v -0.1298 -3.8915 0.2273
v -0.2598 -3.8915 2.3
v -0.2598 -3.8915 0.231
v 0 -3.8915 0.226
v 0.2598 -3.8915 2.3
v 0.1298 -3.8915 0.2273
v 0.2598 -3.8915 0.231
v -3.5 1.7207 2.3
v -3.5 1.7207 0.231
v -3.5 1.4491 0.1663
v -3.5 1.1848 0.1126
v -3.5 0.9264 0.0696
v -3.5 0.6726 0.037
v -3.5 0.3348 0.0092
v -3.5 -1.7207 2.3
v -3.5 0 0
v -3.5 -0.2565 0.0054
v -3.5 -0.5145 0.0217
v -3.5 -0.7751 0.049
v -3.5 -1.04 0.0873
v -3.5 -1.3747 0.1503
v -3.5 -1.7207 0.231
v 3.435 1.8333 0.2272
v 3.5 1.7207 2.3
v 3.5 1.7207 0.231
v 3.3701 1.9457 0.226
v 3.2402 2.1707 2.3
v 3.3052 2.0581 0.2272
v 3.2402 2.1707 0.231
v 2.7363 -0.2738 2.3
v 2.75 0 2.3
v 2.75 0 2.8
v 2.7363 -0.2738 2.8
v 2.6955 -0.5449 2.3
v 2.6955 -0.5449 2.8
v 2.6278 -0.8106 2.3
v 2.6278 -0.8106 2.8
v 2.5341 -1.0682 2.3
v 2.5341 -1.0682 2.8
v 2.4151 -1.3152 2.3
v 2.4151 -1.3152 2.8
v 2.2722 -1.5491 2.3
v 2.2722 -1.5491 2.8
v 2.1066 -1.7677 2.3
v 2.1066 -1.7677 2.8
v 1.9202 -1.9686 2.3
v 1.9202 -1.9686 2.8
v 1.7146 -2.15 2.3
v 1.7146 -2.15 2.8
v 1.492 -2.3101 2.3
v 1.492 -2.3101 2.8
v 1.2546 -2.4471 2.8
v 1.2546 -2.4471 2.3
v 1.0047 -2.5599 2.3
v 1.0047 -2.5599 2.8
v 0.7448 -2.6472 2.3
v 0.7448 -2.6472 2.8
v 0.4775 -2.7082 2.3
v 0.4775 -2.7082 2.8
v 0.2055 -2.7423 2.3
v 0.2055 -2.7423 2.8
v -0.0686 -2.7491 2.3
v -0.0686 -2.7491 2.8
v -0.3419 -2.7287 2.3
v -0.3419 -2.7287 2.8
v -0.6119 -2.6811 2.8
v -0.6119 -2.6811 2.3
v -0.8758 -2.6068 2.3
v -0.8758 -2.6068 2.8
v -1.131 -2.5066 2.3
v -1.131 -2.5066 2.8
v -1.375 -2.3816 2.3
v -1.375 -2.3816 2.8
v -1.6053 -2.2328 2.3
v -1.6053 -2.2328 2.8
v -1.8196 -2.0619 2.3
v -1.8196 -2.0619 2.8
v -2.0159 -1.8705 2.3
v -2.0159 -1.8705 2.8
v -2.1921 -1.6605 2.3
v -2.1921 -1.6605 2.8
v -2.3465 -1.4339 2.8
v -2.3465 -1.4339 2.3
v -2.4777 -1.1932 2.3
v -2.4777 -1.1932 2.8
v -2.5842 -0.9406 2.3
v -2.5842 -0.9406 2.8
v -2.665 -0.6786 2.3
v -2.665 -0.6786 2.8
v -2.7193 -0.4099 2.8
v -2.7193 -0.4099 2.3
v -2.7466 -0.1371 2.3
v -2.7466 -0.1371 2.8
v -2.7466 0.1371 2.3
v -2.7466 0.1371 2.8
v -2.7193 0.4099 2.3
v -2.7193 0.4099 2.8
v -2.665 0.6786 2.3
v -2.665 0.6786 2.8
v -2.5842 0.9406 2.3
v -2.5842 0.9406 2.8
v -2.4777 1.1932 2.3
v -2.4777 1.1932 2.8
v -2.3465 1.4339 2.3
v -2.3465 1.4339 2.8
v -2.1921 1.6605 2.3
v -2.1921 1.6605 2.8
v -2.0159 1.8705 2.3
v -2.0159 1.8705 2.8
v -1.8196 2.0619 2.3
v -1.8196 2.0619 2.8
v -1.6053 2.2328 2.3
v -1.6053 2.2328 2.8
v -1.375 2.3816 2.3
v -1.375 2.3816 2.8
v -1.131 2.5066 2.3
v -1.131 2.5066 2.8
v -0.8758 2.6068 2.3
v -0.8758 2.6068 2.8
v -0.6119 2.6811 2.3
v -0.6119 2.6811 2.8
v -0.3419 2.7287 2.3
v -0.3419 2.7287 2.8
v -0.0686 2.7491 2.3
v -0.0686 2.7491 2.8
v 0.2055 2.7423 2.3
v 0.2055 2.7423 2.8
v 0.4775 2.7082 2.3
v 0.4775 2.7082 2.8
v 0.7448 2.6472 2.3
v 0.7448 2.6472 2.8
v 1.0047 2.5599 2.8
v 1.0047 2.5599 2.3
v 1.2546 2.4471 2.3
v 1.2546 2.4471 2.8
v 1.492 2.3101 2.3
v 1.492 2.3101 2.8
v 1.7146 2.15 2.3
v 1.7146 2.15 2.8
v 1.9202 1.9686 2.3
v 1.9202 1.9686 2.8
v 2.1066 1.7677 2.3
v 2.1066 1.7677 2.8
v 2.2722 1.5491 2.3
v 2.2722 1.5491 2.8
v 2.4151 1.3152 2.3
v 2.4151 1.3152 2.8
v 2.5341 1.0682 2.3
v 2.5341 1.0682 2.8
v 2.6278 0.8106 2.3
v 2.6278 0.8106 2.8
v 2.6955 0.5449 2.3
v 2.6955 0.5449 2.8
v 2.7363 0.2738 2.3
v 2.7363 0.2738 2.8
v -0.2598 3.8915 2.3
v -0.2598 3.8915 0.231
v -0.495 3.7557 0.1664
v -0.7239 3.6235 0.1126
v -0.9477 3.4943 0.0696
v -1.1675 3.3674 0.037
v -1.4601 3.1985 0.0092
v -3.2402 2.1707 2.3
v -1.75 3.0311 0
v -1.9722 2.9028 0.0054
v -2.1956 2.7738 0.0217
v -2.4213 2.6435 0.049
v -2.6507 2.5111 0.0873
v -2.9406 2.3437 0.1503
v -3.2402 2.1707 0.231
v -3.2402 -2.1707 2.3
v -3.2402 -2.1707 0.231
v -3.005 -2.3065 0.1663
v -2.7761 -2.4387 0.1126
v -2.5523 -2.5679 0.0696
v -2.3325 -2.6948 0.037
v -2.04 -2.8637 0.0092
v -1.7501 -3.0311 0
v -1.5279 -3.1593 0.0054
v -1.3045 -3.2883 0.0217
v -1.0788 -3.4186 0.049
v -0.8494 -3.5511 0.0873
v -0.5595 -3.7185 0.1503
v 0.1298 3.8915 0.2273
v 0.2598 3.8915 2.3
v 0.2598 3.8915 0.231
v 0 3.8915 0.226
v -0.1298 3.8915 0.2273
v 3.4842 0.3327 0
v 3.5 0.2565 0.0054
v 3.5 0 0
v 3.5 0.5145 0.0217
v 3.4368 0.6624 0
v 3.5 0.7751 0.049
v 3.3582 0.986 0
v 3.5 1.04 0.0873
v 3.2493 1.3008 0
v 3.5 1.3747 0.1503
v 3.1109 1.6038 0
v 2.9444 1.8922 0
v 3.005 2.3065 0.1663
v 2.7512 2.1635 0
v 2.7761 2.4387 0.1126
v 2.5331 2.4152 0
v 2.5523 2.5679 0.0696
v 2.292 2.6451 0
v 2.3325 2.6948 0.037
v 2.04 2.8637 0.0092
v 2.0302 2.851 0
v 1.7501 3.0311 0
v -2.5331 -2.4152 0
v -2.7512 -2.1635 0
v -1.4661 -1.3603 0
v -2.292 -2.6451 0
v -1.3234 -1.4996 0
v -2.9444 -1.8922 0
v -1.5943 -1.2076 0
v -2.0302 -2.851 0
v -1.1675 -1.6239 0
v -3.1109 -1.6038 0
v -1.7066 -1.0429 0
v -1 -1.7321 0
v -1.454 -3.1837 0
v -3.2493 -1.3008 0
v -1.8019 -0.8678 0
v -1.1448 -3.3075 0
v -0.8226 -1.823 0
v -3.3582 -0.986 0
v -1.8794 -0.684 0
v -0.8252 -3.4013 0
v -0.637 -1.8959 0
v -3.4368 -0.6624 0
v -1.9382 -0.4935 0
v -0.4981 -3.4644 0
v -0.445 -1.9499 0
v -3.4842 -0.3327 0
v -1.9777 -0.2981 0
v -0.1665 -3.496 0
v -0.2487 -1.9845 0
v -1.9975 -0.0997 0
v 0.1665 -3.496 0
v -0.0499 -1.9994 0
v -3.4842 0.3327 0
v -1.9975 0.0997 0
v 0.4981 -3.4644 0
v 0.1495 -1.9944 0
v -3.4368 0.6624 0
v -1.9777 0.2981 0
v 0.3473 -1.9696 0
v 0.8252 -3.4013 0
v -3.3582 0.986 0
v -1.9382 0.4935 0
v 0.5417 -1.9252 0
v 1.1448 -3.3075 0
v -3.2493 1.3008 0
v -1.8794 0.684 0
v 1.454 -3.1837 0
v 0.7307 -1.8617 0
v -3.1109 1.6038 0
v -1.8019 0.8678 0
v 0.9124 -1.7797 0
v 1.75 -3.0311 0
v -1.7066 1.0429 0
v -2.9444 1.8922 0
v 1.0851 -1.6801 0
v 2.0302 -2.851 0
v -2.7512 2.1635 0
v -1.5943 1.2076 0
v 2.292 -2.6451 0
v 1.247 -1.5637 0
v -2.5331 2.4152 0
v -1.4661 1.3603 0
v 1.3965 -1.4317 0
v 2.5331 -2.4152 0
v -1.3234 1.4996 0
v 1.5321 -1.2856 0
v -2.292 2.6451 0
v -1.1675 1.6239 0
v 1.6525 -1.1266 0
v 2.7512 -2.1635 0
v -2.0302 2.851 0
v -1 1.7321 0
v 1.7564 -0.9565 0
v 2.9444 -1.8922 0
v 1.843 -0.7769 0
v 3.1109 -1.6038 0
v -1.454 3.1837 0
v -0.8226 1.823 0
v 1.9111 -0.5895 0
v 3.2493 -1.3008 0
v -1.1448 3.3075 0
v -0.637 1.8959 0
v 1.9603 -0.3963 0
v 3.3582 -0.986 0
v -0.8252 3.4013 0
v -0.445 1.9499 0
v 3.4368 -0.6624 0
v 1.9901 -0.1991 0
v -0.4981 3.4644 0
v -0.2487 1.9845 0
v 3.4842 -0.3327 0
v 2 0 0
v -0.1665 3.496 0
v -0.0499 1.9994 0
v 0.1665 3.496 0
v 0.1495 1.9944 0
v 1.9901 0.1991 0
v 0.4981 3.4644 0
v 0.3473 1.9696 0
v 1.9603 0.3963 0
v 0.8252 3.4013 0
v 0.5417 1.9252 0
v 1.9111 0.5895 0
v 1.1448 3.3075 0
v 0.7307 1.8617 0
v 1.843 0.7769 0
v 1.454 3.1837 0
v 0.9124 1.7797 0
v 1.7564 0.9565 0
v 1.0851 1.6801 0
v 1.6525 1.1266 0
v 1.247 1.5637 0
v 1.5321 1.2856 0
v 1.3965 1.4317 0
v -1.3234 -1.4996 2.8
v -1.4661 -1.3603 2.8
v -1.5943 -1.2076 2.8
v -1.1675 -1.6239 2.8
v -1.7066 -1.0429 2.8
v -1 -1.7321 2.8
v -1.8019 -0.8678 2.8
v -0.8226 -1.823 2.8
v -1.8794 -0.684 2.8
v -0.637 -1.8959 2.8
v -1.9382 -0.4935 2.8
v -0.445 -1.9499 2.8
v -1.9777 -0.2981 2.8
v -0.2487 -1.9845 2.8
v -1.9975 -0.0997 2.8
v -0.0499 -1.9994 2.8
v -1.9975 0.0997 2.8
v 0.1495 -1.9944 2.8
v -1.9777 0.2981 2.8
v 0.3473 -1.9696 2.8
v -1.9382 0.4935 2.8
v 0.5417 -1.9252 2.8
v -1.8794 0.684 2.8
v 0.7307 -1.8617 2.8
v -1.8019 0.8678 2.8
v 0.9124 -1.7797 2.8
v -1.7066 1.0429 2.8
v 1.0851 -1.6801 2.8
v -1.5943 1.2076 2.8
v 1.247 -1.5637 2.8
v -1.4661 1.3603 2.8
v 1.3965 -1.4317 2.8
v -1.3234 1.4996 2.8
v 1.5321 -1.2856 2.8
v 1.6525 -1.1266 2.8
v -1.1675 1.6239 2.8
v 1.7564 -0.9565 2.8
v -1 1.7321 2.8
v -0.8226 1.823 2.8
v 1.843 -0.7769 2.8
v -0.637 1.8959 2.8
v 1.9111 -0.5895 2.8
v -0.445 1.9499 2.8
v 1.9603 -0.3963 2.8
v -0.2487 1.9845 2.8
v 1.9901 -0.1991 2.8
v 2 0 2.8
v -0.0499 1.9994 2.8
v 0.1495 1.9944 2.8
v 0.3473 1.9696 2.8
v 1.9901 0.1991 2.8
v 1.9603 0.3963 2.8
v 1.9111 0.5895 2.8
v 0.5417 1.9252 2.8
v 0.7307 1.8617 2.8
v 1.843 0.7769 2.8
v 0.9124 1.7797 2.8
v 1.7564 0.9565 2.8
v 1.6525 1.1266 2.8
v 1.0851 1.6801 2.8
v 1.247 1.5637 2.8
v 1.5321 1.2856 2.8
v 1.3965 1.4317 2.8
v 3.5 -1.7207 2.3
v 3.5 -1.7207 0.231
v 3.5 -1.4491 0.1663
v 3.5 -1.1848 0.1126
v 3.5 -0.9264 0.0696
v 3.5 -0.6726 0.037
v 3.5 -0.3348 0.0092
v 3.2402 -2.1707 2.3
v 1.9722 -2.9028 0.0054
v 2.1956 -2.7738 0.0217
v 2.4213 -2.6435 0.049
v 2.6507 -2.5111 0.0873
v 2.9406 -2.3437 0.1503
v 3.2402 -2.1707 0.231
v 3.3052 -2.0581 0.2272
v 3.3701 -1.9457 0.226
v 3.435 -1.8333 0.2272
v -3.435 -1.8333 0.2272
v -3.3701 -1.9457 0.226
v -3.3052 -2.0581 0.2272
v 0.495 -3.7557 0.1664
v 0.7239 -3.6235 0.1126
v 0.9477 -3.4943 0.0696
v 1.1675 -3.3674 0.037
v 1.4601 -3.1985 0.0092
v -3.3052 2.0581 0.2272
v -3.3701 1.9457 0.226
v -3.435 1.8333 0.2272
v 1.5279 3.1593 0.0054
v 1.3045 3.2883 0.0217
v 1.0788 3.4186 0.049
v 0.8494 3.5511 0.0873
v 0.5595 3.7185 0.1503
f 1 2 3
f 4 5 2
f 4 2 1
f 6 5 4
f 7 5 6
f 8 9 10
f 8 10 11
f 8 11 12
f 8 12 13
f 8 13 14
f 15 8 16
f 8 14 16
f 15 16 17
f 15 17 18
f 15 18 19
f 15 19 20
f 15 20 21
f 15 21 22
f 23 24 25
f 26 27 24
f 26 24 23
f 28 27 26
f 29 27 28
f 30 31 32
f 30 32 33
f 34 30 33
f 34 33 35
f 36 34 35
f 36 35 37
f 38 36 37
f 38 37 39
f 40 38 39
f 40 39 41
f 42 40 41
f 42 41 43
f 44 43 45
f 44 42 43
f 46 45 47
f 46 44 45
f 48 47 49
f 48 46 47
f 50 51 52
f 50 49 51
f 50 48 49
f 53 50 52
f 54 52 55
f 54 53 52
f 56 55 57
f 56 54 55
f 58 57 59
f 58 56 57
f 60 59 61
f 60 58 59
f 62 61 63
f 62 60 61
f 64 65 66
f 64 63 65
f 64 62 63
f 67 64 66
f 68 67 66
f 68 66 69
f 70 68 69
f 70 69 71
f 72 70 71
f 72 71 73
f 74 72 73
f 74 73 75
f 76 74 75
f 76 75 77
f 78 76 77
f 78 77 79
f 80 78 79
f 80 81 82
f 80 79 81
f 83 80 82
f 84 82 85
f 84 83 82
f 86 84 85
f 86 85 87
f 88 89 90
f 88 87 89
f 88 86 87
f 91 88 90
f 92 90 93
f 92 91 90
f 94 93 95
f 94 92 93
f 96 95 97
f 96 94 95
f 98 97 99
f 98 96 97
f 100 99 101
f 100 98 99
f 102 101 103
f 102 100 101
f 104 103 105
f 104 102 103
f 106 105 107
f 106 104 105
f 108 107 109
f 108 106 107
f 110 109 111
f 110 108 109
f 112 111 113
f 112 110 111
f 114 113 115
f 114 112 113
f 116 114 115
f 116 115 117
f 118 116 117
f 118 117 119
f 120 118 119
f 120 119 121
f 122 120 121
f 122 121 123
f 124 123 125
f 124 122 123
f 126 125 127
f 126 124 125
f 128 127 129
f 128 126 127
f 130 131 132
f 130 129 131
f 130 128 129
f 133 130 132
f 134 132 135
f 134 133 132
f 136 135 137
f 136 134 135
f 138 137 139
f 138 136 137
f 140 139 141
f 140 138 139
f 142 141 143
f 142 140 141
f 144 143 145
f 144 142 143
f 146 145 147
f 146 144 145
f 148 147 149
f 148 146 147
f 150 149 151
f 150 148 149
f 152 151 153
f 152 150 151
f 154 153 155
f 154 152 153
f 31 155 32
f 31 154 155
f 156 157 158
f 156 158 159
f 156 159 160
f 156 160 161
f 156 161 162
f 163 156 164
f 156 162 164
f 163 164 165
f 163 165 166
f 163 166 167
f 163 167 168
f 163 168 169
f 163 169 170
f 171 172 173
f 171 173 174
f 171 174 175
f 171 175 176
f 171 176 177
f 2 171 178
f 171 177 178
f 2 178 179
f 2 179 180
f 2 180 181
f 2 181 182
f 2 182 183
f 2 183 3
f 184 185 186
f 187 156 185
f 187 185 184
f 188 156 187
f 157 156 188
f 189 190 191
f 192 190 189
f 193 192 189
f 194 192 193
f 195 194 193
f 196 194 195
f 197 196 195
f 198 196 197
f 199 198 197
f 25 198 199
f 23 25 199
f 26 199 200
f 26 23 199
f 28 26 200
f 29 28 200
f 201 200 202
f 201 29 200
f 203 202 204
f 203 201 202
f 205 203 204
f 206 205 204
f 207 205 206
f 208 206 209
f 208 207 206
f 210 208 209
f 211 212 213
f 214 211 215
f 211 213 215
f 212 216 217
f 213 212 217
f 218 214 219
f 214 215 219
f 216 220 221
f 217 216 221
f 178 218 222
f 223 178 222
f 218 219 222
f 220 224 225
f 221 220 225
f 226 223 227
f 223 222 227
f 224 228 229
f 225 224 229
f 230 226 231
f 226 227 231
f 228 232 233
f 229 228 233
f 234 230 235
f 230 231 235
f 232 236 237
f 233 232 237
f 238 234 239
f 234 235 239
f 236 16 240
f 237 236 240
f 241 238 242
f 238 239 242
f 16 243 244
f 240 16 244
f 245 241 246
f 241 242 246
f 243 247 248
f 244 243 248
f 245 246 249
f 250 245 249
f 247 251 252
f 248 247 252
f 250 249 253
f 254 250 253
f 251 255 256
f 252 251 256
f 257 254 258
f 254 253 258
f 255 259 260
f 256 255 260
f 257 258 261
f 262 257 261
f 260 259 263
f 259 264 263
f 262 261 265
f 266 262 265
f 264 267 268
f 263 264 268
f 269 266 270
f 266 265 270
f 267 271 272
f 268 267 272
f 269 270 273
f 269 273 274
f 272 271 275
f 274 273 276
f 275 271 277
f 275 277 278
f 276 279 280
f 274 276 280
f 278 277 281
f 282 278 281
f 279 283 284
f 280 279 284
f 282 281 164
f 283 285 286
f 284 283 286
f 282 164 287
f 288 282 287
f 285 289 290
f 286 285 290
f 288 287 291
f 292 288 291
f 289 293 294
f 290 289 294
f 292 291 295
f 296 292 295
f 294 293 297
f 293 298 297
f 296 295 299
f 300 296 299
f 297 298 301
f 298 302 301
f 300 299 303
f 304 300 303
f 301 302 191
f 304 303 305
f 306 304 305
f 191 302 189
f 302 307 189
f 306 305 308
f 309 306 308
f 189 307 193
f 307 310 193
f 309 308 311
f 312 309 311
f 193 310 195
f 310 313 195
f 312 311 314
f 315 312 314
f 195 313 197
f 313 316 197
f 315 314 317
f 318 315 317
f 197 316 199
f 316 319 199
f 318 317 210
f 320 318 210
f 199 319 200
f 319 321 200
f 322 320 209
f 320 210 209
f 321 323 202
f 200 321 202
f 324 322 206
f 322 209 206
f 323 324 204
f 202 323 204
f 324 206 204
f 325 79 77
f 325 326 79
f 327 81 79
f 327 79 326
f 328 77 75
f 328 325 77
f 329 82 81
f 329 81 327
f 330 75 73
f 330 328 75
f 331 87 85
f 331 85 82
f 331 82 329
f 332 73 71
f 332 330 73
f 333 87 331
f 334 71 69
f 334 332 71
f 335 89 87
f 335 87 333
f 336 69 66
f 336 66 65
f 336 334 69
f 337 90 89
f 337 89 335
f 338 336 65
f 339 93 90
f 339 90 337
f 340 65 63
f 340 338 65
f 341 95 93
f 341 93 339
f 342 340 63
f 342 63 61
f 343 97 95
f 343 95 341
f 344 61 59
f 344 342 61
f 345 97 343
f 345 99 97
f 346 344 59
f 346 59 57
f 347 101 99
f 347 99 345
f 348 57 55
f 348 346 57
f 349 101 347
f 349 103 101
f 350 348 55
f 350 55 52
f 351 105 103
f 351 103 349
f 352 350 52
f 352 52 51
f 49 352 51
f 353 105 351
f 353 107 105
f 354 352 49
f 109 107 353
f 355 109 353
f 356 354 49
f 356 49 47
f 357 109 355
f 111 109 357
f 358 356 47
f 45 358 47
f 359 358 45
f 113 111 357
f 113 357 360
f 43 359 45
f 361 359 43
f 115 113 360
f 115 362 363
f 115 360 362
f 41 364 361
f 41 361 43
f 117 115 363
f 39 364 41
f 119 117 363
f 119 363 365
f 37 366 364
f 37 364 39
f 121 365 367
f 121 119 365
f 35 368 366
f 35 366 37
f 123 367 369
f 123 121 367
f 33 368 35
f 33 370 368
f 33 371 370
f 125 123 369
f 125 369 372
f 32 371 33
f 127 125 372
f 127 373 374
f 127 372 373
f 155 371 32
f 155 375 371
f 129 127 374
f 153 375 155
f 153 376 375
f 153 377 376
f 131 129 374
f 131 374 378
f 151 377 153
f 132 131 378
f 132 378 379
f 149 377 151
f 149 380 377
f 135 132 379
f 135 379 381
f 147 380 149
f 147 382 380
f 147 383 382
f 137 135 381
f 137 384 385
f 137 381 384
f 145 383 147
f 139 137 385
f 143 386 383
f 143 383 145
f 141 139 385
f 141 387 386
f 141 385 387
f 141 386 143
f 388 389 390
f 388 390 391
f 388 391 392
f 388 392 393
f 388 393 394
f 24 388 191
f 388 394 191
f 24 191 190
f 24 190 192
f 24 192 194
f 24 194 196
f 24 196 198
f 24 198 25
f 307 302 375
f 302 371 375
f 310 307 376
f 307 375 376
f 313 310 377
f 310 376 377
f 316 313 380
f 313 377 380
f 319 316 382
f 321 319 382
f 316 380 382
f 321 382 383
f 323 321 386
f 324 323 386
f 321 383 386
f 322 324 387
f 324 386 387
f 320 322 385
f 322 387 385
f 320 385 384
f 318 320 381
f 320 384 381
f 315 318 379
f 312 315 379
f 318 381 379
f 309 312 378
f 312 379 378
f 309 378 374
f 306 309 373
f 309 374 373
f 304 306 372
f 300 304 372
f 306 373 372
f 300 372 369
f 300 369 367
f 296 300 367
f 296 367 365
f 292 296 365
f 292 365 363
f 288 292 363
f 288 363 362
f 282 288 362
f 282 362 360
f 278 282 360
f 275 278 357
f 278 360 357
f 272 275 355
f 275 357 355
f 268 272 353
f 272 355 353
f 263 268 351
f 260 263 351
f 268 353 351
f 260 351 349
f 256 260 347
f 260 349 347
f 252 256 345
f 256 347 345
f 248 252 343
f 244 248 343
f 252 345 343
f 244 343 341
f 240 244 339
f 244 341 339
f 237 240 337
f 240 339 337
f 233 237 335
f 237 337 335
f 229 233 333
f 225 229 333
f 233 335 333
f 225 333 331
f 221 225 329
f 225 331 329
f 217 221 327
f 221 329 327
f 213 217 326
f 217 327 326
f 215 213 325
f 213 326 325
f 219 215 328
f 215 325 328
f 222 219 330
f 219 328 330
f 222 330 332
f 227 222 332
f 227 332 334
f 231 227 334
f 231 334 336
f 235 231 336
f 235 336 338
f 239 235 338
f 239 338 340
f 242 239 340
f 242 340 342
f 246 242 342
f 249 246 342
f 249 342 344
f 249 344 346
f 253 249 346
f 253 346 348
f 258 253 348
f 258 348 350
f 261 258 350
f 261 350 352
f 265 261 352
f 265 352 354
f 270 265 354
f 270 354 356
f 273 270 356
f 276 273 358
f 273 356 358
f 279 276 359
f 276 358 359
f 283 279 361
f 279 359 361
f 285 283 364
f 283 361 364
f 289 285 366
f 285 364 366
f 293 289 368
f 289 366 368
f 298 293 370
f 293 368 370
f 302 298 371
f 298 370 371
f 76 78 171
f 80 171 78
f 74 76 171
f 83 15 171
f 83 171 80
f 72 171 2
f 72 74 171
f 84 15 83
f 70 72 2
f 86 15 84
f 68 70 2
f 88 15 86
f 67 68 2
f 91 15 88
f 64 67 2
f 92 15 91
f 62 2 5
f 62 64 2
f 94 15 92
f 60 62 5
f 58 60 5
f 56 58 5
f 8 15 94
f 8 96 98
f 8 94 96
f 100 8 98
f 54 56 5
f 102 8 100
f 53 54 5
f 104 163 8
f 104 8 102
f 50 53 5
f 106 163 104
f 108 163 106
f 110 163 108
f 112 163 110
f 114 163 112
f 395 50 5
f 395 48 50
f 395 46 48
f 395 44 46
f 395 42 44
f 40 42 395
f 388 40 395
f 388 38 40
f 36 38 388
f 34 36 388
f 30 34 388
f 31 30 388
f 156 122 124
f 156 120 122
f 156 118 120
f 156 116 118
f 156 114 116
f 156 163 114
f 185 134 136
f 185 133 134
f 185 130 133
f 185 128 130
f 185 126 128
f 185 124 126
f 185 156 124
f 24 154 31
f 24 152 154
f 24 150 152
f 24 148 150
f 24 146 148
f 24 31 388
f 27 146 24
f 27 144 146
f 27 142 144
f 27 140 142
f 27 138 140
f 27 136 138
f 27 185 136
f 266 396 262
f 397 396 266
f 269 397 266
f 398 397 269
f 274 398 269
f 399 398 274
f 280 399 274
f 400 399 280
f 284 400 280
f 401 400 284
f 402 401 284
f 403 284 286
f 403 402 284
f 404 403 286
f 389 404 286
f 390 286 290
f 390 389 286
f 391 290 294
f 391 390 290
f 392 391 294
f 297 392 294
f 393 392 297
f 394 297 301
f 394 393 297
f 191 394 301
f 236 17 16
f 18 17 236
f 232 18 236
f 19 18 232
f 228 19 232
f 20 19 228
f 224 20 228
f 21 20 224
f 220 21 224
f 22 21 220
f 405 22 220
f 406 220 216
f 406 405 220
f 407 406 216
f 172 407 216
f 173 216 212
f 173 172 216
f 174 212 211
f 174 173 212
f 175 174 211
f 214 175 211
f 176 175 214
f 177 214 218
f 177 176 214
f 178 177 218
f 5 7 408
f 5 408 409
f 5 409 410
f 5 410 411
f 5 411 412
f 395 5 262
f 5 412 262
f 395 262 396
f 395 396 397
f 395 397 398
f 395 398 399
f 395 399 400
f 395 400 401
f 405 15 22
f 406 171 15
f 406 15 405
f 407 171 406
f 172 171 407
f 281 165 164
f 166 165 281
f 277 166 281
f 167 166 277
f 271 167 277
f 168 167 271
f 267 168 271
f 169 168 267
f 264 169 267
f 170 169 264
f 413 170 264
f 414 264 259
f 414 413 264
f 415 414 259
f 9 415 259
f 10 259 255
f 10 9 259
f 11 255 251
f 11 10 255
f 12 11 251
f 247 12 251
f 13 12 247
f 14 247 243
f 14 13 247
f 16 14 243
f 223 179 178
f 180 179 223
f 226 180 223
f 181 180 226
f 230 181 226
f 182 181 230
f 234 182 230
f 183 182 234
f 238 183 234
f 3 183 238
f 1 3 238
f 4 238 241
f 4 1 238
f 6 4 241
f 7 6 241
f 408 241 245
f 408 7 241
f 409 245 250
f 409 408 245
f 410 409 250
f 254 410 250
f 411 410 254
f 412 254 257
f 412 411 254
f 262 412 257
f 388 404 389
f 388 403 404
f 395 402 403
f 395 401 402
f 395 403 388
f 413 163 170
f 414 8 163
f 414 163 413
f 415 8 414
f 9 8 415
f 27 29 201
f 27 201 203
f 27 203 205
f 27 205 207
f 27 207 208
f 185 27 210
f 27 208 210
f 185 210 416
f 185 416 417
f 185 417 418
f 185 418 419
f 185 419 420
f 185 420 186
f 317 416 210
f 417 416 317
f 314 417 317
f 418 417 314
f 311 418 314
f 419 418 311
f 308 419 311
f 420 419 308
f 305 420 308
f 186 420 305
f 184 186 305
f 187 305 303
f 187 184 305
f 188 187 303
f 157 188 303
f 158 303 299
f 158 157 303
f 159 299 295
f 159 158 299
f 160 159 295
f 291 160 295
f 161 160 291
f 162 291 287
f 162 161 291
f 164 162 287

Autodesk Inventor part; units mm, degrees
ref_plane "YZ Plane" through (0, 0, 0) normal (1, 0, 0) x (0, 1, 0)
ref_plane "XZ Plane" through (0, 0, 0) normal (0, 1, 0) x (-1, 0, 0)
ref_plane "XY Plane" through (0, 0, 0) normal (0, 0, 1) x (1, 0, 0)
sketch "スケッチ1" plane through (0, 0, 0) normal (0, 1, 0) x (-1, 0, 0)
  line L0 (-2, 0) -> (-2, 2.8)
  line L1 (-2, 2.8) -> (-2.75, 2.8)
  line L2 (-2.75, 2.8) -> (-2.75, 2.3)
  line L3 (-2.75, 2.3) -> (-4.0415, 2.3)
  line L4 (-4.0415, 2.3) -> (-4.0415, 0.3126)
  line L5 (-3.5, 0) -> (-2, 0)
  line L6 (-4.0415, 0.3126) -> (-3.5, 0)
  line L7 (0, -0.56) -> (0, 3.36) projected
  point P0 (0, 0)
  dimension "d0" = 3.5
  dimension "d1" = 4.0415
  dimension "d2" = 30
  dimension "d3" = 0.5
  dimension "d4" = 2.8
  dimension "d5" = 4
  dimension "d6" = 5.5
revolve "回転1" add sketch "スケッチ1" angle 360 about axis through (0, 0, -10) along (0, 0, 1)
sketch "スケッチ2" plane through (0, 0, 0) normal (0, 0, -1) x (-1, 0, 0)
  circle A0 centre (0, 0) radius 4.0415 projected
  line L0 (0, 4.0415) -> (3.5, 2.0207)
  line L1 (3.5, 2.0207) -> (3.5, -2.0207)
  line L2 (3.5, -2.0207) -> (0, -4.0415)
  line L3 (0, -4.0415) -> (-3.5, -2.0207)
  line L4 (-3.5, -2.0207) -> (-3.5, 2.0207)
  line L5 (-3.5, 2.0207) -> (0, 4.0415)
  point P0 (-3.5, 2.0207)
  point P1 (-3.5, 2.0207)
  point P2 (-3.5, -2.0207)
  point P3 (-3.5, -2.0207)
  point P4 (0, -4.0415)
  point P5 (0, -4.0415)
  point P6 (3.5, -2.0207)
  point P7 (3.5, -2.0207)
  point P8 (3.5, 2.0207)
  point P9 (3.5, 2.0207)
extrude "押し出し1" cut sketch "スケッチ2" against normal through all contours A0 L1 | L0 A0 | A0 L2 | L5 A0 | A0 L3 | L4 A0
chamfer "面取り1" distance 0.3 angle 45 6 edges at (0, 4.0415, 1.3063) (-3.5, 2.0207, 1.3063) (3.5, 2.0207, 1.3063) (3.5, -2.0207, 1.3063) (0, -4.0415, 1.3063) (-3.5, -2.0207, 1.3063)
thread "ねじ1" size "M4x0.7" class "6H" standard "ANSI Metric M Profile" full length
equation "\"d1\" = 1.1547 * d0"
properties part number "S4-05-3W" material "チタン"
